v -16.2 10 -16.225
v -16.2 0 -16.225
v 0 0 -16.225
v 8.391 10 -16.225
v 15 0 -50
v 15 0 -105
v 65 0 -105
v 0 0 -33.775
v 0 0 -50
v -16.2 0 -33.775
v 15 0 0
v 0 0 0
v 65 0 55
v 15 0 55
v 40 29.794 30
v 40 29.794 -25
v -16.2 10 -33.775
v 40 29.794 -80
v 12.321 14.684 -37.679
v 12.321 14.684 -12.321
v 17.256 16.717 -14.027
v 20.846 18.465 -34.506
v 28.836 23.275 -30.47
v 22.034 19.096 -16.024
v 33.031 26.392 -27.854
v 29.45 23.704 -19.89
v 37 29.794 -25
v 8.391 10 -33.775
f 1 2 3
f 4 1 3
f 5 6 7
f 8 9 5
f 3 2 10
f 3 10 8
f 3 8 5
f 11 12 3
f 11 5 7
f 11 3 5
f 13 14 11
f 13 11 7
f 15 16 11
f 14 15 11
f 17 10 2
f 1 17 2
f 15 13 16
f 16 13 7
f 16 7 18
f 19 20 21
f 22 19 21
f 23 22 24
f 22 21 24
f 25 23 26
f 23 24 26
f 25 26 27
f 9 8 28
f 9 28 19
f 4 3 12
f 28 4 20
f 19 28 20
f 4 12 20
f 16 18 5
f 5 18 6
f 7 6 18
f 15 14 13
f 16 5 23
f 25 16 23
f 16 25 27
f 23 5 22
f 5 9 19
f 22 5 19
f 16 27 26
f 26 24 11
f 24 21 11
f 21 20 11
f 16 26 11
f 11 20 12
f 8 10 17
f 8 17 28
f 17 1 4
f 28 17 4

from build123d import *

# Parameters (mm, degrees)
BOSS_EXTRUDE1_START       = -105
BOSS_EXTRUDE1_DEPTH       = 160
BOSS_EXTRUDE1_2_DEPTH     = 40
BOSS_EXTRUDE1_START_2     = -20
BOSS_EXTRUDE1_3_OUTLINE_W = 47
BOSS_EXTRUDE1_3_OUTLINE_H = 147
BOSS_EXTRUDE1_3_DEPTH     = 20
BOSS_EXTRUDE1_START_3     = 42.132444372
BOSS_EXTRUDE1_4_OUTLINE_W = 53
BOSS_EXTRUDE1_4_OUTLINE_H = 116
BOSS_EXTRUDE1_4_DEPTH     = 19.867555628
BOSS_EXTRUDE1_START_4     = 80.434666527
BOSS_EXTRUDE1_5_OUTLINE_W = 52
BOSS_EXTRUDE1_5_OUTLINE_H = 117
BOSS_EXTRUDE1_5_DEPTH     = 20.565333473
SKETCH2_W                 = 32.400830654
SKETCH2_H                 = 17.550449938
BOSS_EXTRUDE2_DEPTH       = 10
SKETCH4_R                 = 75
CUT_EXTRUDE1_DEPTH        = 80


with BuildPart() as part:
    # Boss-Extrude1: read off the stored shape, not the designer's step
    # Boss-Extrude1 outline → Boss-Extrude1 (new body)
    with BuildSketch(Plane.XY.offset(BOSS_EXTRUDE1_START)):
        Polygon((65, 0), (40, 29.793839815), (15, 0), align=None)
    extrude(amount=BOSS_EXTRUDE1_DEPTH)

    # Boss-Extrude1 2 outline → Boss-Extrude1 2 (add)
    with BuildSketch(Plane.YZ):
        Polygon((0, -50), (29.793839815, -25), (0, 0), align=None)
    extrude(amount=BOSS_EXTRUDE1_2_DEPTH)

    # Boss-Extrude1 3 outline → Boss-Extrude1 3 (cut)
    with BuildSketch(Plane(origin=(0, 0, 0), x_dir=(0.6427876096865404, 0.7660444431189772, 0), z_dir=(0.7660444431189772, -0.6427876096865403, 0)).offset(BOSS_EXTRUDE1_START_2)):
        with Locations((22.5, -24.5)):
            Rectangle(BOSS_EXTRUDE1_3_OUTLINE_W, BOSS_EXTRUDE1_3_OUTLINE_H)
    extrude(amount=BOSS_EXTRUDE1_3_DEPTH, mode=Mode.SUBTRACT)

    # Boss-Extrude1 4 outline → Boss-Extrude1 4 (cut)
    with BuildSketch(Plane(origin=(0, 0, 0), x_dir=(1, 0, 0), z_dir=(0, 0.6427876096865403, 0.7660444431189772)).offset(BOSS_EXTRUDE1_START_3)):
        with Locations((40.5, 21)):
            Rectangle(BOSS_EXTRUDE1_4_OUTLINE_W, BOSS_EXTRUDE1_4_OUTLINE_H)
    extrude(amount=BOSS_EXTRUDE1_4_DEPTH, mode=Mode.SUBTRACT)

    # Boss-Extrude1 5 outline → Boss-Extrude1 5 (cut)
    with BuildSketch(Plane(origin=(0, 0, 0), x_dir=(1, 0, 0), z_dir=(0, 0.6427876096865403, -0.7660444431189772)).offset(BOSS_EXTRUDE1_START_4)):
        with Locations((40, 10.5)):
            Rectangle(BOSS_EXTRUDE1_5_OUTLINE_W, BOSS_EXTRUDE1_5_OUTLINE_H)
    extrude(amount=BOSS_EXTRUDE1_5_DEPTH, mode=Mode.SUBTRACT)

    # Sketch2 → Boss-Extrude2 (add)
    with BuildSketch(Plane.XZ):
        with Locations((0, -25)):
            Rectangle(SKETCH2_W, SKETCH2_H)
    extrude(amount=-BOSS_EXTRUDE2_DEPTH)

    # Sketch4 → Cut-Extrude1 (cut, symmetric)
    with BuildSketch(Plane.XY):
        with Locations((-13.767329279, 85)):
            Circle(SKETCH4_R)
    extrude(amount=CUT_EXTRUDE1_DEPTH, both=True, mode=Mode.SUBTRACT)


solid = part.part
